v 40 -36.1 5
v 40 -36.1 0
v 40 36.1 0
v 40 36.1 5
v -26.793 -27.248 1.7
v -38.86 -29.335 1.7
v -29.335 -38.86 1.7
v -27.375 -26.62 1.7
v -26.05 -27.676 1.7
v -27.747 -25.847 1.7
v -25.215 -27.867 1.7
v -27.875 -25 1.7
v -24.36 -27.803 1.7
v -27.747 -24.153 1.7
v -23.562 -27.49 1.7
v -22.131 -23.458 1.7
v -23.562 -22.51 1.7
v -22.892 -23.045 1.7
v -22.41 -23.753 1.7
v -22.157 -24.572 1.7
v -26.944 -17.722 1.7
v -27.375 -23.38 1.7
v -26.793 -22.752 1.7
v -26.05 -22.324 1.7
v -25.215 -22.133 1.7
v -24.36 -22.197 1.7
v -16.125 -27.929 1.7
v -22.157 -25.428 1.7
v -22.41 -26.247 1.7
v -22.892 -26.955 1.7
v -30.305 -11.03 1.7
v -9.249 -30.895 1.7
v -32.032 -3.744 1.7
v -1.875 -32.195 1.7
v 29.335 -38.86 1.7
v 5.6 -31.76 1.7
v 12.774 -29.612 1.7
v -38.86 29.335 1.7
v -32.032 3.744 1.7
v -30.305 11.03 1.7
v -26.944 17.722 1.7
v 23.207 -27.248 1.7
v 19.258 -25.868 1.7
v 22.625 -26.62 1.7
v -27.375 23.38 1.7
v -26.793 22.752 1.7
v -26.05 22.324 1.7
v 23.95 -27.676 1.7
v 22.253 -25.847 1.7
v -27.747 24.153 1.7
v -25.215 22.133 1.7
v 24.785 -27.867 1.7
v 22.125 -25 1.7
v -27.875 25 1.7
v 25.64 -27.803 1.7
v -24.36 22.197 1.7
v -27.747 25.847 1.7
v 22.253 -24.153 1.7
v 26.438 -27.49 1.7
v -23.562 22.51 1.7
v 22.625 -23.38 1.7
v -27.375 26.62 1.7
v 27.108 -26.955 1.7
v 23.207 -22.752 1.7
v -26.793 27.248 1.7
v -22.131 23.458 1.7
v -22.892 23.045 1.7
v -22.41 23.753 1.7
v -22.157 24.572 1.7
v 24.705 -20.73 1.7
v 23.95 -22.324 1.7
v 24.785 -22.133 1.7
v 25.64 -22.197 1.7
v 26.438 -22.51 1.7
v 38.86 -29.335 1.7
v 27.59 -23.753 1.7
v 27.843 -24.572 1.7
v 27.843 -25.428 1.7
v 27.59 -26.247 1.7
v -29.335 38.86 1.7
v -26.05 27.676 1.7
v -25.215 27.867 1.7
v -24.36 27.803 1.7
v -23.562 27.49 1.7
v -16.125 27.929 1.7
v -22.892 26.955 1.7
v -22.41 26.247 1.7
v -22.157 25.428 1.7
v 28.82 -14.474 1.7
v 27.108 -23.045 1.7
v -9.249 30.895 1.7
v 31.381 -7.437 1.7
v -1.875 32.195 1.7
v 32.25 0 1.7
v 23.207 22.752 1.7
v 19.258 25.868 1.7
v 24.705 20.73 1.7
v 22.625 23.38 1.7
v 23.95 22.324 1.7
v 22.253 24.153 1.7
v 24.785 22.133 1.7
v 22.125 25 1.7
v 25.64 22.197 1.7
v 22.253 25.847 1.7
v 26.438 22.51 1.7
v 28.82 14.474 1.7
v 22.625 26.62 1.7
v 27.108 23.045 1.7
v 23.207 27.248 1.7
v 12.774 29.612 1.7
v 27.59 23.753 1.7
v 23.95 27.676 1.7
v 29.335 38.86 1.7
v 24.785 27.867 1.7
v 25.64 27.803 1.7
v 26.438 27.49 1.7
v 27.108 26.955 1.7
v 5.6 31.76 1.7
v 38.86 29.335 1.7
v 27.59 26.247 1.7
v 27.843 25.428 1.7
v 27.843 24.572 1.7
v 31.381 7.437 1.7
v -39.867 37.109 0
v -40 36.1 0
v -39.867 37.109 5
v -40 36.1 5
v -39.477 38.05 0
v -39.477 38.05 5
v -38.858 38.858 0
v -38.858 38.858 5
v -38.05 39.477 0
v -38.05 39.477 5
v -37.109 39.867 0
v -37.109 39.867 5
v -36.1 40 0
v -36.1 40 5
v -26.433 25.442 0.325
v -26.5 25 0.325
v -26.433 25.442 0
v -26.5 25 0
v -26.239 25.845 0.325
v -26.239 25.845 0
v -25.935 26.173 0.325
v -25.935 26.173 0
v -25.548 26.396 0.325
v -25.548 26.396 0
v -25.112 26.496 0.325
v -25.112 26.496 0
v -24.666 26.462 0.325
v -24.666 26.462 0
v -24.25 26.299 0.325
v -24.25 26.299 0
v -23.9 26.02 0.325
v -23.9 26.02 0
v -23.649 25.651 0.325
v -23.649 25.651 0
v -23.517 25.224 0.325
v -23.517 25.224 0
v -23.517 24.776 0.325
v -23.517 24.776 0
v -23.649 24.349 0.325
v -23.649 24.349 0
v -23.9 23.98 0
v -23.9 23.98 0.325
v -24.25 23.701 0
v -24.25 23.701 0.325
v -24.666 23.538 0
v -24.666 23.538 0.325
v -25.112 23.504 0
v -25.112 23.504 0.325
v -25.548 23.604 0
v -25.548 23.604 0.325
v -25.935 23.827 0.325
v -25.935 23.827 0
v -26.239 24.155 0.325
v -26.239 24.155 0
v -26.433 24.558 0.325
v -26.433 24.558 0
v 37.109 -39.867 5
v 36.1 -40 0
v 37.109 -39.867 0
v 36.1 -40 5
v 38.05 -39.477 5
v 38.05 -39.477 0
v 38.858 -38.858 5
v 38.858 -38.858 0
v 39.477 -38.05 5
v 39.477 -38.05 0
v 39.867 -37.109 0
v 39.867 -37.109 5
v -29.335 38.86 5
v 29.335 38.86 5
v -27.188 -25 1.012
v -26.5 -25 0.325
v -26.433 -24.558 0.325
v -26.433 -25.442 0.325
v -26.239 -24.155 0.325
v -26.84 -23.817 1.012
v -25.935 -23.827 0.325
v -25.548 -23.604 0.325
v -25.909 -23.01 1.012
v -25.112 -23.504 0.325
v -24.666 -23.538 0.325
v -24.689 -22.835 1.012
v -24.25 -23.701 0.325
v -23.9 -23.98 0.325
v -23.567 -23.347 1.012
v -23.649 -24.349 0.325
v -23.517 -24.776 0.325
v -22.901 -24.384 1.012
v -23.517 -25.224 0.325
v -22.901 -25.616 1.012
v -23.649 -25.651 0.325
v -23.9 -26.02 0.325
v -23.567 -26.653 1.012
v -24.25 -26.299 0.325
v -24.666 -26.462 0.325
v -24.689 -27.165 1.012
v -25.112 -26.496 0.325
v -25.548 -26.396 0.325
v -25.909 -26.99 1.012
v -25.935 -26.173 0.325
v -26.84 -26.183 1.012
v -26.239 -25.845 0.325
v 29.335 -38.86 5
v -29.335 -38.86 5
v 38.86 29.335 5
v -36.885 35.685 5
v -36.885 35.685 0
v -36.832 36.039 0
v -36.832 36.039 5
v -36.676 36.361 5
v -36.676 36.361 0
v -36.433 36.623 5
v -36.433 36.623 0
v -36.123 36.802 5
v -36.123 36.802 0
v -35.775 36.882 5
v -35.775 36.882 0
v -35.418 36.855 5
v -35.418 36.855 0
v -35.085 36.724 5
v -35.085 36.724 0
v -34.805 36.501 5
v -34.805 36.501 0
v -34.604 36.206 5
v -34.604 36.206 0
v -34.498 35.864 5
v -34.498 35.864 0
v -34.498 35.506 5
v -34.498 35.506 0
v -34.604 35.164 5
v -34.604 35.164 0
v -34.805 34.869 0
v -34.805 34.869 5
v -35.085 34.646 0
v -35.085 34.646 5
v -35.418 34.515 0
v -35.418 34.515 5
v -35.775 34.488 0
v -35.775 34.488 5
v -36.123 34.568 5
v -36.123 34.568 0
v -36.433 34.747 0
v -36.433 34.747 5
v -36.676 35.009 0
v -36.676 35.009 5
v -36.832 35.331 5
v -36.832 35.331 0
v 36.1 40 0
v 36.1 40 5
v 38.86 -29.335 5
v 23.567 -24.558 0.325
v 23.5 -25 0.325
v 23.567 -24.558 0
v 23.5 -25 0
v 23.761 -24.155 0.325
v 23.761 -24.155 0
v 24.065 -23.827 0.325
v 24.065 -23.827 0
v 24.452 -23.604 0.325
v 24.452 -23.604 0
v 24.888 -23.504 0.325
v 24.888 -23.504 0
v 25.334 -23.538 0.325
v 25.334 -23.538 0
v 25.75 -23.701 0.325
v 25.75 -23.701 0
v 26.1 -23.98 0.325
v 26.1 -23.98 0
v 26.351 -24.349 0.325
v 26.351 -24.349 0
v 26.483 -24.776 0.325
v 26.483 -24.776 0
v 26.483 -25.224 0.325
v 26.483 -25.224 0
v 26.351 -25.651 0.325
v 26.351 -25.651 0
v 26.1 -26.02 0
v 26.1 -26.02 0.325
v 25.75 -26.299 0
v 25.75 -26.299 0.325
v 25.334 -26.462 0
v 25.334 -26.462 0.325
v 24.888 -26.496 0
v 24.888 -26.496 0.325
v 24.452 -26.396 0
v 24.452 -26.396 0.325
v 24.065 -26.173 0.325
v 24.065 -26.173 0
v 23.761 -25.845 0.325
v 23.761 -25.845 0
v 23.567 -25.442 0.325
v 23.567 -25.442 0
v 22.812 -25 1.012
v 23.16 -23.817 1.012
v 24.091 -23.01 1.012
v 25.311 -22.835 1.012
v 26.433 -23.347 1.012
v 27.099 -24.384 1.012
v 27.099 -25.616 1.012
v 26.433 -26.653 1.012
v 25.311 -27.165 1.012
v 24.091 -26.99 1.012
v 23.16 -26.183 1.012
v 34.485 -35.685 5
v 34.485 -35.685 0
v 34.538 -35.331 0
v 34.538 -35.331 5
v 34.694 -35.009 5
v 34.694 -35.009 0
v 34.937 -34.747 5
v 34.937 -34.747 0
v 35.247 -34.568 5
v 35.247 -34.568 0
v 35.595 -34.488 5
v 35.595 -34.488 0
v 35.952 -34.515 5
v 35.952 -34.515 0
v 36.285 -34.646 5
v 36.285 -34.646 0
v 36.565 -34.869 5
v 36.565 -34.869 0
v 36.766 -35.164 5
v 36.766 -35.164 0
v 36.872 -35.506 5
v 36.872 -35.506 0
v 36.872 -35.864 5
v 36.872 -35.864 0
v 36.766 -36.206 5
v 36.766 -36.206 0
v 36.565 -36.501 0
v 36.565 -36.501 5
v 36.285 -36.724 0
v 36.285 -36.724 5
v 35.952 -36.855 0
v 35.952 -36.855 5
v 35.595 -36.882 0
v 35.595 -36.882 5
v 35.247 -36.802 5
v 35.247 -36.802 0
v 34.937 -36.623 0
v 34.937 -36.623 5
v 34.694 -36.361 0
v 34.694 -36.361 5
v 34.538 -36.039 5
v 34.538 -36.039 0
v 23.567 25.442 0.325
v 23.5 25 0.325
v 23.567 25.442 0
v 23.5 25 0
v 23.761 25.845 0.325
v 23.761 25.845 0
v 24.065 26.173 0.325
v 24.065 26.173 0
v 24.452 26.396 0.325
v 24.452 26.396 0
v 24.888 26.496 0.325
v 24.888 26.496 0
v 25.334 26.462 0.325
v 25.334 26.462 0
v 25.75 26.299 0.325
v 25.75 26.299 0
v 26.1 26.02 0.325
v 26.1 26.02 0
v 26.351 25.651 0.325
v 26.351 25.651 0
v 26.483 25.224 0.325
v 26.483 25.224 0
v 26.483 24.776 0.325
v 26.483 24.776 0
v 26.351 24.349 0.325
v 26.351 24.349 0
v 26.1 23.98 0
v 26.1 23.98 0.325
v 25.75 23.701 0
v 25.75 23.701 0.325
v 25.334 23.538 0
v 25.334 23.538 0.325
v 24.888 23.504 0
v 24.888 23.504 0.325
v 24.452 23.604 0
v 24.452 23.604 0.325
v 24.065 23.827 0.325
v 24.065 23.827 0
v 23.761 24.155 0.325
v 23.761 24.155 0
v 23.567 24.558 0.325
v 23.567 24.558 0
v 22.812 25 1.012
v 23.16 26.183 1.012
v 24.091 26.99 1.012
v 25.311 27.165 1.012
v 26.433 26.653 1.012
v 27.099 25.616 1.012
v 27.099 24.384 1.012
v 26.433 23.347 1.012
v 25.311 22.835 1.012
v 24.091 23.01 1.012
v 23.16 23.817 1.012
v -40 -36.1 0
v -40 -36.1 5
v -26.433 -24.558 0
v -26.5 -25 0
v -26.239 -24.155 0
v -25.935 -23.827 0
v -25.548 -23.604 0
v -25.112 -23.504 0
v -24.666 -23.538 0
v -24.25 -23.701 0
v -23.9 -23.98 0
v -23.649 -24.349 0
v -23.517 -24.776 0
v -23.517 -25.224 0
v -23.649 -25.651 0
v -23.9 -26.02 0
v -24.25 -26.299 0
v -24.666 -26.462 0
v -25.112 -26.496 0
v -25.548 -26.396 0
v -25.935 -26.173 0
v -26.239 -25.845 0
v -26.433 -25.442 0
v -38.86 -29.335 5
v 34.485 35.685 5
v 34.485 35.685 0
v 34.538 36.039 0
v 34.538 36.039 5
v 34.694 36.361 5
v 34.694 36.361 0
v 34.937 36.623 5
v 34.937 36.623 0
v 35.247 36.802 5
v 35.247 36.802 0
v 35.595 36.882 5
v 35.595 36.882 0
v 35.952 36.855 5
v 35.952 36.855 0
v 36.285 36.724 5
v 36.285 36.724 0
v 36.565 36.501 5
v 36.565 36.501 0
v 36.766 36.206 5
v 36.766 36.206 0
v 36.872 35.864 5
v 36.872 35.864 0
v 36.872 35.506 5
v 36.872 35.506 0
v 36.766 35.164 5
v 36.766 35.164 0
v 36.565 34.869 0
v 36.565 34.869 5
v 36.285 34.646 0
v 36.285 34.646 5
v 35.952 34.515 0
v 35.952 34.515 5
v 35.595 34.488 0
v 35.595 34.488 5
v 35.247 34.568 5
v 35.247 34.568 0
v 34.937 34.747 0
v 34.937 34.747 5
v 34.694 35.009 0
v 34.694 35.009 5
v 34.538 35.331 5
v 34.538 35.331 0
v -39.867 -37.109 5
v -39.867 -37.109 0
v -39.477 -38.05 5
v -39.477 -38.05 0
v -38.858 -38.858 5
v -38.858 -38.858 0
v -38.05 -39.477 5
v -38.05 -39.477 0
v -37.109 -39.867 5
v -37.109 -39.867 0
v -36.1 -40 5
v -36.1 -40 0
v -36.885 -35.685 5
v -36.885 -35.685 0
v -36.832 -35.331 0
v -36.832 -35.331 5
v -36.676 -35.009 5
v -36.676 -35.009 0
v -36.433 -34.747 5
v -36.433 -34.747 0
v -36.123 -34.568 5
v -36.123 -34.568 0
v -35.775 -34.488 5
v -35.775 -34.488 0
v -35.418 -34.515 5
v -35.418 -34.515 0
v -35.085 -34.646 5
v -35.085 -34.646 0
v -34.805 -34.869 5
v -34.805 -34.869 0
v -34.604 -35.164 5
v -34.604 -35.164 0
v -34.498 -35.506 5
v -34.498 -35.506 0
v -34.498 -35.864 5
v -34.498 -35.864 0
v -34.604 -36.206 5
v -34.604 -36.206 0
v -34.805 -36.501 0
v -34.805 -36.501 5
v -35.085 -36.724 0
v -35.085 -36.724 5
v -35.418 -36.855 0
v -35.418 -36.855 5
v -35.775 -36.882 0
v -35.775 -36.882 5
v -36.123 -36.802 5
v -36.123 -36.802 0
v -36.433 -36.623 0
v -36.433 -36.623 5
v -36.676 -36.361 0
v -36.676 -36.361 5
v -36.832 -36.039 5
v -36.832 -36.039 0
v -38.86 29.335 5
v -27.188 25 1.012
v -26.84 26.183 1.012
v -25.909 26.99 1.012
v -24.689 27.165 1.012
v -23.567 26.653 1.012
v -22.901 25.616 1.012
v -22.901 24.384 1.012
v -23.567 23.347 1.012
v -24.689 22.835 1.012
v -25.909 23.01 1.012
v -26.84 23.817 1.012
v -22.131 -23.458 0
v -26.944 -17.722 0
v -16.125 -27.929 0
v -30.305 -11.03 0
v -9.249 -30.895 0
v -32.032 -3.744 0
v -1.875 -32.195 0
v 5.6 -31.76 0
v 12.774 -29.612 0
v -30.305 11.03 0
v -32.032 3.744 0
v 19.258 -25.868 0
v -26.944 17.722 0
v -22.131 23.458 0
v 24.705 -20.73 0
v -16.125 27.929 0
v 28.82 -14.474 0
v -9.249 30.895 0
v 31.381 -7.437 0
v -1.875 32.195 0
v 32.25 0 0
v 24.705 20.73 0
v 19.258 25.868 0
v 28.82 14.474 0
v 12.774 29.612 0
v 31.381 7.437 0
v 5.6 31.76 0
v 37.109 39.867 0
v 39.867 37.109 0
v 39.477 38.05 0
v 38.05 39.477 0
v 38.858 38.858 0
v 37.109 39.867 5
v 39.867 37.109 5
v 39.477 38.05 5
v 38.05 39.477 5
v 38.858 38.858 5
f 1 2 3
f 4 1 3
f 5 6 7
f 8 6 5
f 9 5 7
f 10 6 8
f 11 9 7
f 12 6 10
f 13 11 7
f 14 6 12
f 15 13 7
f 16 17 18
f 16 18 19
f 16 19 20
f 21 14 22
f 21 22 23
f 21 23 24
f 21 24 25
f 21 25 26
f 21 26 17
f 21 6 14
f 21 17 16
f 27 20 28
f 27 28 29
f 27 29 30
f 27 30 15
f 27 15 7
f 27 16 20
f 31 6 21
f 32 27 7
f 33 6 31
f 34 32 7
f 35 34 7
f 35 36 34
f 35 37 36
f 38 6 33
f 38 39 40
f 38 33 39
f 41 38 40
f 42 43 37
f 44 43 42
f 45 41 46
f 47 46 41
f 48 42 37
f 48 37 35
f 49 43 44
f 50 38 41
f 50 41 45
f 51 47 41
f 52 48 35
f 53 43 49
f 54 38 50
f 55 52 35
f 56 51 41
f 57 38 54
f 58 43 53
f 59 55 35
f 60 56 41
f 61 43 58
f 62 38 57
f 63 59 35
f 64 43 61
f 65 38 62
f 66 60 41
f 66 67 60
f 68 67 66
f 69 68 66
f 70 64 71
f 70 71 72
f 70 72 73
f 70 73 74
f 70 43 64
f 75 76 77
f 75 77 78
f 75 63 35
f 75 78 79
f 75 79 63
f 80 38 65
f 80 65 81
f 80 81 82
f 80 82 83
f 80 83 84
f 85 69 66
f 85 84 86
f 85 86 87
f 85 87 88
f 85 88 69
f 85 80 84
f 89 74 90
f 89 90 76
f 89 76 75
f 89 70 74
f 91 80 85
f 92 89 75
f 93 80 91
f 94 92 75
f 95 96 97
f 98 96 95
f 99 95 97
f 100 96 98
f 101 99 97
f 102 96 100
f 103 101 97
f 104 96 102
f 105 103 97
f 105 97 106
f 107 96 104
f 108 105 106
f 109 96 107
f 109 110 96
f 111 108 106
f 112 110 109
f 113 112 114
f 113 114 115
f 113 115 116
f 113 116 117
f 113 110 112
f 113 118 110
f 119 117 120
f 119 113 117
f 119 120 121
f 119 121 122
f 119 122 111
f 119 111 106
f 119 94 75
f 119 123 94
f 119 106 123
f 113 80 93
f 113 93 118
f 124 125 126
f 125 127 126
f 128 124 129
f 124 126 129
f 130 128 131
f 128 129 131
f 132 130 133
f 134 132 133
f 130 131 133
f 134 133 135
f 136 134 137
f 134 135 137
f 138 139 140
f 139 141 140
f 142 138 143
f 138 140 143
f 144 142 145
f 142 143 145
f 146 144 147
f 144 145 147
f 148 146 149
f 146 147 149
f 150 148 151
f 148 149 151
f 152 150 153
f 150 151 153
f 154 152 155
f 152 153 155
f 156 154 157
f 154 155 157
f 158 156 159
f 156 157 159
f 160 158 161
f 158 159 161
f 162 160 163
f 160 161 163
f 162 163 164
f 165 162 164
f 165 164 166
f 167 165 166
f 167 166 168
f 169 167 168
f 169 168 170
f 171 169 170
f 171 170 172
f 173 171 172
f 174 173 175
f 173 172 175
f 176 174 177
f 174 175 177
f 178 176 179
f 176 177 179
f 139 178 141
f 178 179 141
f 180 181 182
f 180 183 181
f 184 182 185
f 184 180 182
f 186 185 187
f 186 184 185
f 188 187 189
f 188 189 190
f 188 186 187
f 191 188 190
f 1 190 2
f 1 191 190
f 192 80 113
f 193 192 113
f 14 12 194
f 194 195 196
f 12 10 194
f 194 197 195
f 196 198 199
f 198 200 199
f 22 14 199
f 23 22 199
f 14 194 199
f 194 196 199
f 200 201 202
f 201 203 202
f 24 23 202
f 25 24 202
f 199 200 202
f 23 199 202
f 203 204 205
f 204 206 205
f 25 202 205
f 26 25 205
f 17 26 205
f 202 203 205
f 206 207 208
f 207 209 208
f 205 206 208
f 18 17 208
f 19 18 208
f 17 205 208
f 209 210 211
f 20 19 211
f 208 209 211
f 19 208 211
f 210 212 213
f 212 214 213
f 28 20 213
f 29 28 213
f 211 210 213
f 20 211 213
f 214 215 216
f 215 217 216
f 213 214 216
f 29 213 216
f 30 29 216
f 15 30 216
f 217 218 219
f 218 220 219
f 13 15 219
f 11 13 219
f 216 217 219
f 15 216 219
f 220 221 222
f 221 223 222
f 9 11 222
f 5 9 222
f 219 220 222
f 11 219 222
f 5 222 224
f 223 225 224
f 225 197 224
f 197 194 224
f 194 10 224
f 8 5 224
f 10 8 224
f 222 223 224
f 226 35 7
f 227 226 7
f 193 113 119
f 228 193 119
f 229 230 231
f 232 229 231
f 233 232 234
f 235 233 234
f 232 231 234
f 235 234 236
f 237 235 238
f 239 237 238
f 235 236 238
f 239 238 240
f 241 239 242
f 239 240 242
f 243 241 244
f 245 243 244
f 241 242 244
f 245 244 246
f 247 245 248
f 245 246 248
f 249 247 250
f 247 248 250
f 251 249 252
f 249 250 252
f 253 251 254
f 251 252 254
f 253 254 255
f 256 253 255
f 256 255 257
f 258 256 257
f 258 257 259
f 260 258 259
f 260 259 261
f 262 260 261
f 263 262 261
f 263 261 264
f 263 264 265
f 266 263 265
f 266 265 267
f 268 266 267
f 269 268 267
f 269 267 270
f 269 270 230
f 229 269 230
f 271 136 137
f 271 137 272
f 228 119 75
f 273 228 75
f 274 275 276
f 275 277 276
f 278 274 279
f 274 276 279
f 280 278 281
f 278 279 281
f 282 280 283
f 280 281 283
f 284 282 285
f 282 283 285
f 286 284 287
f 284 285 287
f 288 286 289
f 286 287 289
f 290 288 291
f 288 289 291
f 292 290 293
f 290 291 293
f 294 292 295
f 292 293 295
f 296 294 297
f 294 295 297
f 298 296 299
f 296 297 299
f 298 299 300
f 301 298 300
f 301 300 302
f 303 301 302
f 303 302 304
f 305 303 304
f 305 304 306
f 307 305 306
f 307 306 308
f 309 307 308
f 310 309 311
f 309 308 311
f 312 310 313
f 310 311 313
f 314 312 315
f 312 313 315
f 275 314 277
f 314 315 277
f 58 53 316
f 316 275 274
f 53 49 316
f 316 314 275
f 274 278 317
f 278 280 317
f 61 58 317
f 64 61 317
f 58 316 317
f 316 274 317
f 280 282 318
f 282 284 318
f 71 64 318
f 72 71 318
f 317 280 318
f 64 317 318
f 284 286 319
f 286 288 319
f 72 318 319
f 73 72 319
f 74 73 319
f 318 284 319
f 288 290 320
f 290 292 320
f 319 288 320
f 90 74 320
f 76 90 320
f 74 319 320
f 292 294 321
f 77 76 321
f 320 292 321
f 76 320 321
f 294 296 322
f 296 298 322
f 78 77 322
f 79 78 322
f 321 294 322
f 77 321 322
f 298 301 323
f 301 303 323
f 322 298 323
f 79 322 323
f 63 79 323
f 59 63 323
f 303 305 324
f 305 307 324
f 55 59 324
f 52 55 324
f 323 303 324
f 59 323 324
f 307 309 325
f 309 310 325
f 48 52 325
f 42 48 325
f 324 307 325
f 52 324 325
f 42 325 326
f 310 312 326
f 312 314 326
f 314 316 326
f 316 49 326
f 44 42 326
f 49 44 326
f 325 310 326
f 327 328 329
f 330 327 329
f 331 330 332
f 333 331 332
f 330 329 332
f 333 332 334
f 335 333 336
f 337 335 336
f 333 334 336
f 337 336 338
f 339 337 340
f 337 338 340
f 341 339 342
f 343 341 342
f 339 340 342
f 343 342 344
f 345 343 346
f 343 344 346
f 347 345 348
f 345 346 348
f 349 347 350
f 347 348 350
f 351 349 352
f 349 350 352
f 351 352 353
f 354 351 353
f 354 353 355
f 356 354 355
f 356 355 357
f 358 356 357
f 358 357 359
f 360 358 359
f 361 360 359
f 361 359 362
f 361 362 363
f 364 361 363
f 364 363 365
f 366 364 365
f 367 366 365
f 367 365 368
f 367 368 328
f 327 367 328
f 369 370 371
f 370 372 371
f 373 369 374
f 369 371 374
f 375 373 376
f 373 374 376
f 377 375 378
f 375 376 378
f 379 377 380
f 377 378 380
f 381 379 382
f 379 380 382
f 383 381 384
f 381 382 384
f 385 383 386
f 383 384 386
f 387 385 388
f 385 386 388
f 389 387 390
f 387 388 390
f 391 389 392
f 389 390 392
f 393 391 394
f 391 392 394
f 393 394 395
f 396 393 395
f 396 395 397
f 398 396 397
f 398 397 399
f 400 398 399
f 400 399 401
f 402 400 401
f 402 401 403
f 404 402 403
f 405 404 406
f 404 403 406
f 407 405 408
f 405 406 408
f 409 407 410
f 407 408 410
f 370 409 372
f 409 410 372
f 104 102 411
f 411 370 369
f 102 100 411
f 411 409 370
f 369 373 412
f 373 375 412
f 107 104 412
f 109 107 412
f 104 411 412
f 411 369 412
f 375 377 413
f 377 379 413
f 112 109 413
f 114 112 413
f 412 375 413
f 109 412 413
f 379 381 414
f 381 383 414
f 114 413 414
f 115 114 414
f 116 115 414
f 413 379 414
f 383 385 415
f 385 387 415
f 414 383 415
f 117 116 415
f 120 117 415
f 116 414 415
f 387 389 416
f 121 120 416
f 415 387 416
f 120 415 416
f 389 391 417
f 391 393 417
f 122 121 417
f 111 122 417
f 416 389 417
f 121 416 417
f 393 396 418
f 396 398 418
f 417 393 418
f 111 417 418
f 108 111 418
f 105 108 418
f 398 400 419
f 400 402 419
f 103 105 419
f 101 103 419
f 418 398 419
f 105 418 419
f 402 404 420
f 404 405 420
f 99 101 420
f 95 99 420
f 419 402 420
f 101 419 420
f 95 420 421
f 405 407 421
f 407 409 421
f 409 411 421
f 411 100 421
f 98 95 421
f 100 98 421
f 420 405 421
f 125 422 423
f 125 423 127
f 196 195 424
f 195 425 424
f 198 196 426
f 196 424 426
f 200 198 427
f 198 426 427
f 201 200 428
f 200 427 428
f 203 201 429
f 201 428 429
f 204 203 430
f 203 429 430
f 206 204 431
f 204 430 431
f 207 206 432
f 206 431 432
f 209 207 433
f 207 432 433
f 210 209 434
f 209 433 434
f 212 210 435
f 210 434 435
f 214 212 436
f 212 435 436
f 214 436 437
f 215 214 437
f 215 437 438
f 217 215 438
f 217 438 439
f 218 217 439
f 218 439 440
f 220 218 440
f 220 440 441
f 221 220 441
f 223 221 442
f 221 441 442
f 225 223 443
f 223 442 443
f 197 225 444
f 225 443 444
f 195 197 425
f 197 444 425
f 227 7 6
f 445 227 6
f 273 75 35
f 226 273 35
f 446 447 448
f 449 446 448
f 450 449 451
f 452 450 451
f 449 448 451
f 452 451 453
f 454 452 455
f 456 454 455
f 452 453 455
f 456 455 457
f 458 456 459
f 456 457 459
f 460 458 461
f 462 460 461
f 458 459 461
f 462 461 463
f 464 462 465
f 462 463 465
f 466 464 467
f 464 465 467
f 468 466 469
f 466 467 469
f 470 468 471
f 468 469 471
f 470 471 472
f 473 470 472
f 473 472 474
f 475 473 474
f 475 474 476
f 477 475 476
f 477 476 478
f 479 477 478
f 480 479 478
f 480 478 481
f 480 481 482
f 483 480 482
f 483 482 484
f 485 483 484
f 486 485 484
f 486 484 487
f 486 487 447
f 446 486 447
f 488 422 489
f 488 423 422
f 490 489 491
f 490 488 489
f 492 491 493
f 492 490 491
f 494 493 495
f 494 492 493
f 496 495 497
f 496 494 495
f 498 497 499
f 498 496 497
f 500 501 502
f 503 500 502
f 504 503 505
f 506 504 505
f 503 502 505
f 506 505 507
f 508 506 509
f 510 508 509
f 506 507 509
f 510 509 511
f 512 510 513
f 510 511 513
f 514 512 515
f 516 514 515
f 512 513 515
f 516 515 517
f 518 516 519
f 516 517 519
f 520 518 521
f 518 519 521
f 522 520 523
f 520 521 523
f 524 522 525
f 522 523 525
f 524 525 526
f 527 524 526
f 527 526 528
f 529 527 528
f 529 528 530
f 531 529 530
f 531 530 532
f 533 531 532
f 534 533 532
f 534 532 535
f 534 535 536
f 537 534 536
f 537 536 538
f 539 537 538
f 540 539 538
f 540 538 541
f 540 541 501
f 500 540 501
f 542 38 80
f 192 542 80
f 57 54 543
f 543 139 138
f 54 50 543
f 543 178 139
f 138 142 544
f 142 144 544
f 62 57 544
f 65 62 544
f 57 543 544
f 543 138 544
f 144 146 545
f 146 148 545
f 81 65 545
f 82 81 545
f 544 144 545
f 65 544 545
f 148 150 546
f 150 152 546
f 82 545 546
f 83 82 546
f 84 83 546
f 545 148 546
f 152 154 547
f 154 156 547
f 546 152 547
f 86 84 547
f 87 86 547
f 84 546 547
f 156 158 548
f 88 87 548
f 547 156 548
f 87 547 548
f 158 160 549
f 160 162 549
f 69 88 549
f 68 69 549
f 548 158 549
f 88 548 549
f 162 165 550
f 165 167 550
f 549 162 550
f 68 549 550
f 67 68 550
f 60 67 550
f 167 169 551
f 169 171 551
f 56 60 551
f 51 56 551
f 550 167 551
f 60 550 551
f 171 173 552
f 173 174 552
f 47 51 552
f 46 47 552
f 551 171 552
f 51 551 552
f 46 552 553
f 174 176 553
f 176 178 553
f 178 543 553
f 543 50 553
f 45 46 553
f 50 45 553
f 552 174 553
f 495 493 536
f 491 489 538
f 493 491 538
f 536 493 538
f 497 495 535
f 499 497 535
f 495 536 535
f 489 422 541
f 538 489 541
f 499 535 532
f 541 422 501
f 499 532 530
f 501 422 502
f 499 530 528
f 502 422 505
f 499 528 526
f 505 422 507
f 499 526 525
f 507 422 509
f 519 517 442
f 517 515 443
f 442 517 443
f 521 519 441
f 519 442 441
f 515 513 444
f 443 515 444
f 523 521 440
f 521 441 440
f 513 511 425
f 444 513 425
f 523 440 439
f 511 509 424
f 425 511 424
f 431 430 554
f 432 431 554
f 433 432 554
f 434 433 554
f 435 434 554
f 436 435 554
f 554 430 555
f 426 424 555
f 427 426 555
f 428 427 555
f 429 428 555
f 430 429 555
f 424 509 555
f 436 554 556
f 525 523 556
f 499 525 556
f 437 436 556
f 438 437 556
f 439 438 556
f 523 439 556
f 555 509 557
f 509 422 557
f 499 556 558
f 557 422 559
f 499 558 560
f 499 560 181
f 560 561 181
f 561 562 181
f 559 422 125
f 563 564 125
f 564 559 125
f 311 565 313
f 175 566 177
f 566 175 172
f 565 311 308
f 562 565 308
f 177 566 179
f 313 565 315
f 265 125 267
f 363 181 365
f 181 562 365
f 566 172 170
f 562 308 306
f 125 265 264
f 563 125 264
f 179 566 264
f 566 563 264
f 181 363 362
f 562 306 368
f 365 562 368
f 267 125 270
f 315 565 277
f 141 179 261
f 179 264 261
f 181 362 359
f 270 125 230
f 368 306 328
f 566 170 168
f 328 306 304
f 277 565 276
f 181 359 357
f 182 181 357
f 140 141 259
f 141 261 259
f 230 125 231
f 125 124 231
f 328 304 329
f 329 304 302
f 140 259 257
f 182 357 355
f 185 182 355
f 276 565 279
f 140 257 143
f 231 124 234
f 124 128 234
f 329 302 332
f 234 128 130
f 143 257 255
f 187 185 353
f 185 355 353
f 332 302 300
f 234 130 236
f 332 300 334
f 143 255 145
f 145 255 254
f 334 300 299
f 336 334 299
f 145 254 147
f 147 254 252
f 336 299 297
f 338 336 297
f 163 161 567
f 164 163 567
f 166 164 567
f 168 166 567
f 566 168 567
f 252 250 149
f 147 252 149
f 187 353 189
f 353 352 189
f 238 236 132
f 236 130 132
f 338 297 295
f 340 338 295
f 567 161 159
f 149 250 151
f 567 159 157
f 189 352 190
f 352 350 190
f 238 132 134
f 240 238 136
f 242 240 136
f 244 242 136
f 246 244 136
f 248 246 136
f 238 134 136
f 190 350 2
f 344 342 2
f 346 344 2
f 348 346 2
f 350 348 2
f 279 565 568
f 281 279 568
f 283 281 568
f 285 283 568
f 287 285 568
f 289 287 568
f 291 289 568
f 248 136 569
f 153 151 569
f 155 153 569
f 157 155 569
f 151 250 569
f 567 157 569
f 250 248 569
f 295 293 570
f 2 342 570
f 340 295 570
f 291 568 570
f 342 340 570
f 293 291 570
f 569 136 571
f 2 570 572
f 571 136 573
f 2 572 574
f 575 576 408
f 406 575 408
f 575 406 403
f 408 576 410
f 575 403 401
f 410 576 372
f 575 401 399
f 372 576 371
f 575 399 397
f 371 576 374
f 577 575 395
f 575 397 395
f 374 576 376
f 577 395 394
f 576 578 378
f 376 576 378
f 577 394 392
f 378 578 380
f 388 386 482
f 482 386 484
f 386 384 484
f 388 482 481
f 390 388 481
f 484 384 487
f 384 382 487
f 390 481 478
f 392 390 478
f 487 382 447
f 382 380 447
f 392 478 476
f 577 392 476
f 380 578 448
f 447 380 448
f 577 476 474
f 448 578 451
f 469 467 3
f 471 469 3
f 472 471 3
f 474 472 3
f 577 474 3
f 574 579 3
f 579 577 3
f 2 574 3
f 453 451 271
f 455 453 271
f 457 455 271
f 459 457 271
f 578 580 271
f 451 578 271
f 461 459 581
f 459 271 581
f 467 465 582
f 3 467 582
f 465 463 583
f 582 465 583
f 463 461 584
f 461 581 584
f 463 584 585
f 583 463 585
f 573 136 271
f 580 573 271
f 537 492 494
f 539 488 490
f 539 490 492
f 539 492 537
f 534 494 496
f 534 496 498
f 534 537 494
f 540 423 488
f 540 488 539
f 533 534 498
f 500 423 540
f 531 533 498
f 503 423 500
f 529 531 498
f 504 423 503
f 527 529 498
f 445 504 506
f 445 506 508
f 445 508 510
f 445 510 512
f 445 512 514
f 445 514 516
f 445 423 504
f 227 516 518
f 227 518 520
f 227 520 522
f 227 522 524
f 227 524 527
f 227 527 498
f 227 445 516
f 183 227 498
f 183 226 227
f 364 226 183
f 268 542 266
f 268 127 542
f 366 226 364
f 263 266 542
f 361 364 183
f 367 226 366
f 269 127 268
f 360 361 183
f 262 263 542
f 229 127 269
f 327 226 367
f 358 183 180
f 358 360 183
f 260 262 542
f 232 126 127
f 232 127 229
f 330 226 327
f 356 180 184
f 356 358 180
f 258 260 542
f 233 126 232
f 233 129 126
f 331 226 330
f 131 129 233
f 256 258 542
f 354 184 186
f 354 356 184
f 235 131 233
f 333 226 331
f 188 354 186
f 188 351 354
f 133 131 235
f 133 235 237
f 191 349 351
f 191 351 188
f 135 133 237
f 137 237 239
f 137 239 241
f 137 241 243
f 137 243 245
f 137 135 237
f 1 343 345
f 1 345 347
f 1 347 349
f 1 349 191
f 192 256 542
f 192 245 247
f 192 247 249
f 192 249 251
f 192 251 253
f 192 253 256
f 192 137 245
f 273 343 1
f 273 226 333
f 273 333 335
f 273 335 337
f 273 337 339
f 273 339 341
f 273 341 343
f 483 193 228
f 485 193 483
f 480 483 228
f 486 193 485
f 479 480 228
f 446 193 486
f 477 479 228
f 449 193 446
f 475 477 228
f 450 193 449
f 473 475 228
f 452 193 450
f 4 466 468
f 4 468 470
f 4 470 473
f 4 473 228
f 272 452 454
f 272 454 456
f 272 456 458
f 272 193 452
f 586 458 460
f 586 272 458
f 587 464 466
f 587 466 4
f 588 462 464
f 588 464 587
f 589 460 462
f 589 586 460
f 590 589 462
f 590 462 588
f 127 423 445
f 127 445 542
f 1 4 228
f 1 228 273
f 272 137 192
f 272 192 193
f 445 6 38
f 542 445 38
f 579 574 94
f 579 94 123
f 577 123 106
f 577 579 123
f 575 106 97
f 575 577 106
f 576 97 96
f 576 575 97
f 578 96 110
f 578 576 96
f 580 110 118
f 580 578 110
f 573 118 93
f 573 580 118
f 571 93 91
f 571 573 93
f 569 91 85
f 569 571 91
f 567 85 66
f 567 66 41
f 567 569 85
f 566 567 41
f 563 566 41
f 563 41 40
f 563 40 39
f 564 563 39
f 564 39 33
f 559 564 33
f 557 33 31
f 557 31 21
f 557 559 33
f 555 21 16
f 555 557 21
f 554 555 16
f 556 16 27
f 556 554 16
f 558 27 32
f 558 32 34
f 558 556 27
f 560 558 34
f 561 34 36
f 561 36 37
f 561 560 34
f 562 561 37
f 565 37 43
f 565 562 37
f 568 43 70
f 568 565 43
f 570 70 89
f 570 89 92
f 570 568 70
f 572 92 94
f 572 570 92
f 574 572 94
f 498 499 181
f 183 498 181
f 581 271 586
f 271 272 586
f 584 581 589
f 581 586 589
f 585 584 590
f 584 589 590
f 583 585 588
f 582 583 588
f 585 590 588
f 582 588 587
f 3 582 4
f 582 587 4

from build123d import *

# Parameters (mm, degrees)
F0_W           = 80
F0_H           = 80
F1_DEPTH       = 5
F0_R           = 32.25
F2_DEPTH       = 1.7
F4_D           = 3
F4_CSINK_D     = 5.75
F4_CSINK_ANGLE = 90
F6_D           = 2.4
F7_R           = 3.9


with BuildPart() as f1:
    # F0 (on Top) → F1 (new body)
    with BuildSketch(Plane.XY):
        Rectangle(F0_W, F0_H)
        Polygon((-38.86, 29.335), (-38.86, 38.86), (-29.335, 38.86), (29.335, 38.86), (38.86, 38.86), (38.86, 29.335), (38.86, -29.335), (38.86, -38.86), (29.335, -38.86), (-29.335, -38.86), (-38.86, -38.86), (-38.86, -29.335), align=None, mode=Mode.SUBTRACT)
        Polygon((-29.335, 38.86), (-38.86, 38.86), (-38.86, 29.335), align=None)
        Polygon((38.86, 38.86), (29.335, 38.86), (38.86, 29.335), align=None)
        Polygon((38.86, -38.86), (38.86, -29.335), (29.335, -38.86), align=None)
        Polygon((-29.335, -38.86), (-38.86, -29.335), (-38.86, -38.86), align=None)
    extrude(amount=F1_DEPTH)

    # F0 (on Top) → F2 (join)
    with BuildSketch(Plane.XY):
        Polygon((29.335, 38.86), (-29.335, 38.86), (-38.86, 29.335), (-38.86, -29.335), (-29.335, -38.86), (29.335, -38.86), (38.86, -29.335), (38.86, 29.335), align=None)
        Circle(F0_R, mode=Mode.SUBTRACT)
    extrude(amount=F2_DEPTH)

    # F4 (through all)
    with Locations(Plane.XY.offset(1.7)):
        with Locations((-25, 25), (25, 25), (25, -25), (-25, -25)):
            CounterSinkHole(F4_D / 2, F4_CSINK_D / 2, counter_sink_angle=F4_CSINK_ANGLE)

    # F6 (through all)
    with Locations(Plane.XY.offset(5)):
        with Locations((-35.685, 35.685), (35.685, 35.685), (35.685, -35.685), (-35.685, -35.685)):
            Hole(F6_D / 2)

    # F7
    f7_edges = [f1.edges().sort_by_distance(p)[0] for p in [
        (-40, -40, 2.5),
        (40, -40, 2.5),
        (40, 40, 2.5),
        (-40, 40, 2.5),
    ]]
    fillet(f7_edges, radius=F7_R)


solid = f1.part
